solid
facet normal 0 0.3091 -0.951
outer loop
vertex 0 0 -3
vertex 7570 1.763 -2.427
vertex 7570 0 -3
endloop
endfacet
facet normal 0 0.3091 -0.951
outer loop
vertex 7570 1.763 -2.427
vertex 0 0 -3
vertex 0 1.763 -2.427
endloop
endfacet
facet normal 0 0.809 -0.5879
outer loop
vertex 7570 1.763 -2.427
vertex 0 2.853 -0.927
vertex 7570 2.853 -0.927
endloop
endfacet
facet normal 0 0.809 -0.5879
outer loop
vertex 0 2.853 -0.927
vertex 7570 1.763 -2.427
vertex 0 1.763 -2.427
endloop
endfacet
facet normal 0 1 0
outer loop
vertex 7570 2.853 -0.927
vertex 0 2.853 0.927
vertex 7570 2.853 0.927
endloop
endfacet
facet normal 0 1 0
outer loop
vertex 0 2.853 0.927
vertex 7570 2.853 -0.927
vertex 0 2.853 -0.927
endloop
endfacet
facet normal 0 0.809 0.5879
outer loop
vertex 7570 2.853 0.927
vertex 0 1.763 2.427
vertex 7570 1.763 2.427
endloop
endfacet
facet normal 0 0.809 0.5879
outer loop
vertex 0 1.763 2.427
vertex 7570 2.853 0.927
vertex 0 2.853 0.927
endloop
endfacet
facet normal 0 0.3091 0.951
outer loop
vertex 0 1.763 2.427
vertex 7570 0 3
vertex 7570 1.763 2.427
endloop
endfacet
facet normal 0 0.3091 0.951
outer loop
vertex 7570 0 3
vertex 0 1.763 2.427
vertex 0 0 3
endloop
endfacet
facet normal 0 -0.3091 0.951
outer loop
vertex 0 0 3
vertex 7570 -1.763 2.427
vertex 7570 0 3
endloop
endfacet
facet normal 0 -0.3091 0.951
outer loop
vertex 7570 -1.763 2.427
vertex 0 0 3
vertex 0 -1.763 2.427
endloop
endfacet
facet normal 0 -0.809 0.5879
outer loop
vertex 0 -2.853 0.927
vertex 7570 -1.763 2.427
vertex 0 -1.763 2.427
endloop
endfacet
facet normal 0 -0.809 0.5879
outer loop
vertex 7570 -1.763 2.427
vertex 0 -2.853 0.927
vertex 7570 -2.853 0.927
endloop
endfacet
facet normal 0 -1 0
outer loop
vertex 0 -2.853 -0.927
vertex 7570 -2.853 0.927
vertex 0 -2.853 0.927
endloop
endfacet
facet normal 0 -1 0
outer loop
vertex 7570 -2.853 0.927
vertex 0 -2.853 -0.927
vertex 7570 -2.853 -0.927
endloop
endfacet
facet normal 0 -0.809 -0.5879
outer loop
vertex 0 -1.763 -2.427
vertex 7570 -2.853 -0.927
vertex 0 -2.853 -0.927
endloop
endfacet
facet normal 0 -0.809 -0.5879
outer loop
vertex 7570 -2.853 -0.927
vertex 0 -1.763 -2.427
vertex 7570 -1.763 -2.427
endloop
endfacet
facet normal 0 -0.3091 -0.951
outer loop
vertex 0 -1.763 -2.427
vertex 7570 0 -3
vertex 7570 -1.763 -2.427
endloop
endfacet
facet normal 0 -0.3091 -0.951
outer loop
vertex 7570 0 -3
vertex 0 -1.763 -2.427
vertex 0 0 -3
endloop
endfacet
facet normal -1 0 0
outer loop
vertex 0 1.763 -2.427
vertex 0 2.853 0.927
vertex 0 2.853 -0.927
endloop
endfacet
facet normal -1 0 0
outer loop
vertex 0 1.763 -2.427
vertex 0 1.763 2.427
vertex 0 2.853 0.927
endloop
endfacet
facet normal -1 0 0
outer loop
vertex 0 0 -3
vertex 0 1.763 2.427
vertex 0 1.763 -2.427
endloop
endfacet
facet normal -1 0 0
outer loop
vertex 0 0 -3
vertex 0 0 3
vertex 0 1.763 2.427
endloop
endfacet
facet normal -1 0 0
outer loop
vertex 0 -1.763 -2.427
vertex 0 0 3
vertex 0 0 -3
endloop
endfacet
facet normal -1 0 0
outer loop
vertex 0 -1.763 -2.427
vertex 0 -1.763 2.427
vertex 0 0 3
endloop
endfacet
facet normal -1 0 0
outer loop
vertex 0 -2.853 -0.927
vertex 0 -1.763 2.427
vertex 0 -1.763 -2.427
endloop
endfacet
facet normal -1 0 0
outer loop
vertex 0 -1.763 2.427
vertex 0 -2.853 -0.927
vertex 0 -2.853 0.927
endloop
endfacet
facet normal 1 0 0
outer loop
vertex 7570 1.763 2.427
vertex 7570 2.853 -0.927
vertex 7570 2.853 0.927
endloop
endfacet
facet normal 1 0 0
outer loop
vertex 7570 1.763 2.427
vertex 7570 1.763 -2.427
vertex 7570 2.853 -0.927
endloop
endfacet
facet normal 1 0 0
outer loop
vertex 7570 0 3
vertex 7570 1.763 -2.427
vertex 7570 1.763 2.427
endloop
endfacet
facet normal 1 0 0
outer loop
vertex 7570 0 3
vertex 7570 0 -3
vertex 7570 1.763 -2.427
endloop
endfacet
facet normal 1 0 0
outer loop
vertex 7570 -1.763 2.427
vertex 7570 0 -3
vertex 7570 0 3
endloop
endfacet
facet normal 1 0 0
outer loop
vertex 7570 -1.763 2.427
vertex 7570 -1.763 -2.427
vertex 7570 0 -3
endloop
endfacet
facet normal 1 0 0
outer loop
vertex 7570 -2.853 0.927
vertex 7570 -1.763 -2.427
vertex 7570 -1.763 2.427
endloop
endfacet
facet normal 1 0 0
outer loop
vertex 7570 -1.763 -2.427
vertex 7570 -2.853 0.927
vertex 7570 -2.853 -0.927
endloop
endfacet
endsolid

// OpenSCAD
diamGenShtag = 6;

//translate([-2000,0,0]) 
GenShtag(7570);

module GenShtag(shtagLen) {
   translate([shtagLen/2, 0, 0]) rotate([0,90,0]) cylinder(h=shtagLen, d=diamGenShtag, center=true);       
}
